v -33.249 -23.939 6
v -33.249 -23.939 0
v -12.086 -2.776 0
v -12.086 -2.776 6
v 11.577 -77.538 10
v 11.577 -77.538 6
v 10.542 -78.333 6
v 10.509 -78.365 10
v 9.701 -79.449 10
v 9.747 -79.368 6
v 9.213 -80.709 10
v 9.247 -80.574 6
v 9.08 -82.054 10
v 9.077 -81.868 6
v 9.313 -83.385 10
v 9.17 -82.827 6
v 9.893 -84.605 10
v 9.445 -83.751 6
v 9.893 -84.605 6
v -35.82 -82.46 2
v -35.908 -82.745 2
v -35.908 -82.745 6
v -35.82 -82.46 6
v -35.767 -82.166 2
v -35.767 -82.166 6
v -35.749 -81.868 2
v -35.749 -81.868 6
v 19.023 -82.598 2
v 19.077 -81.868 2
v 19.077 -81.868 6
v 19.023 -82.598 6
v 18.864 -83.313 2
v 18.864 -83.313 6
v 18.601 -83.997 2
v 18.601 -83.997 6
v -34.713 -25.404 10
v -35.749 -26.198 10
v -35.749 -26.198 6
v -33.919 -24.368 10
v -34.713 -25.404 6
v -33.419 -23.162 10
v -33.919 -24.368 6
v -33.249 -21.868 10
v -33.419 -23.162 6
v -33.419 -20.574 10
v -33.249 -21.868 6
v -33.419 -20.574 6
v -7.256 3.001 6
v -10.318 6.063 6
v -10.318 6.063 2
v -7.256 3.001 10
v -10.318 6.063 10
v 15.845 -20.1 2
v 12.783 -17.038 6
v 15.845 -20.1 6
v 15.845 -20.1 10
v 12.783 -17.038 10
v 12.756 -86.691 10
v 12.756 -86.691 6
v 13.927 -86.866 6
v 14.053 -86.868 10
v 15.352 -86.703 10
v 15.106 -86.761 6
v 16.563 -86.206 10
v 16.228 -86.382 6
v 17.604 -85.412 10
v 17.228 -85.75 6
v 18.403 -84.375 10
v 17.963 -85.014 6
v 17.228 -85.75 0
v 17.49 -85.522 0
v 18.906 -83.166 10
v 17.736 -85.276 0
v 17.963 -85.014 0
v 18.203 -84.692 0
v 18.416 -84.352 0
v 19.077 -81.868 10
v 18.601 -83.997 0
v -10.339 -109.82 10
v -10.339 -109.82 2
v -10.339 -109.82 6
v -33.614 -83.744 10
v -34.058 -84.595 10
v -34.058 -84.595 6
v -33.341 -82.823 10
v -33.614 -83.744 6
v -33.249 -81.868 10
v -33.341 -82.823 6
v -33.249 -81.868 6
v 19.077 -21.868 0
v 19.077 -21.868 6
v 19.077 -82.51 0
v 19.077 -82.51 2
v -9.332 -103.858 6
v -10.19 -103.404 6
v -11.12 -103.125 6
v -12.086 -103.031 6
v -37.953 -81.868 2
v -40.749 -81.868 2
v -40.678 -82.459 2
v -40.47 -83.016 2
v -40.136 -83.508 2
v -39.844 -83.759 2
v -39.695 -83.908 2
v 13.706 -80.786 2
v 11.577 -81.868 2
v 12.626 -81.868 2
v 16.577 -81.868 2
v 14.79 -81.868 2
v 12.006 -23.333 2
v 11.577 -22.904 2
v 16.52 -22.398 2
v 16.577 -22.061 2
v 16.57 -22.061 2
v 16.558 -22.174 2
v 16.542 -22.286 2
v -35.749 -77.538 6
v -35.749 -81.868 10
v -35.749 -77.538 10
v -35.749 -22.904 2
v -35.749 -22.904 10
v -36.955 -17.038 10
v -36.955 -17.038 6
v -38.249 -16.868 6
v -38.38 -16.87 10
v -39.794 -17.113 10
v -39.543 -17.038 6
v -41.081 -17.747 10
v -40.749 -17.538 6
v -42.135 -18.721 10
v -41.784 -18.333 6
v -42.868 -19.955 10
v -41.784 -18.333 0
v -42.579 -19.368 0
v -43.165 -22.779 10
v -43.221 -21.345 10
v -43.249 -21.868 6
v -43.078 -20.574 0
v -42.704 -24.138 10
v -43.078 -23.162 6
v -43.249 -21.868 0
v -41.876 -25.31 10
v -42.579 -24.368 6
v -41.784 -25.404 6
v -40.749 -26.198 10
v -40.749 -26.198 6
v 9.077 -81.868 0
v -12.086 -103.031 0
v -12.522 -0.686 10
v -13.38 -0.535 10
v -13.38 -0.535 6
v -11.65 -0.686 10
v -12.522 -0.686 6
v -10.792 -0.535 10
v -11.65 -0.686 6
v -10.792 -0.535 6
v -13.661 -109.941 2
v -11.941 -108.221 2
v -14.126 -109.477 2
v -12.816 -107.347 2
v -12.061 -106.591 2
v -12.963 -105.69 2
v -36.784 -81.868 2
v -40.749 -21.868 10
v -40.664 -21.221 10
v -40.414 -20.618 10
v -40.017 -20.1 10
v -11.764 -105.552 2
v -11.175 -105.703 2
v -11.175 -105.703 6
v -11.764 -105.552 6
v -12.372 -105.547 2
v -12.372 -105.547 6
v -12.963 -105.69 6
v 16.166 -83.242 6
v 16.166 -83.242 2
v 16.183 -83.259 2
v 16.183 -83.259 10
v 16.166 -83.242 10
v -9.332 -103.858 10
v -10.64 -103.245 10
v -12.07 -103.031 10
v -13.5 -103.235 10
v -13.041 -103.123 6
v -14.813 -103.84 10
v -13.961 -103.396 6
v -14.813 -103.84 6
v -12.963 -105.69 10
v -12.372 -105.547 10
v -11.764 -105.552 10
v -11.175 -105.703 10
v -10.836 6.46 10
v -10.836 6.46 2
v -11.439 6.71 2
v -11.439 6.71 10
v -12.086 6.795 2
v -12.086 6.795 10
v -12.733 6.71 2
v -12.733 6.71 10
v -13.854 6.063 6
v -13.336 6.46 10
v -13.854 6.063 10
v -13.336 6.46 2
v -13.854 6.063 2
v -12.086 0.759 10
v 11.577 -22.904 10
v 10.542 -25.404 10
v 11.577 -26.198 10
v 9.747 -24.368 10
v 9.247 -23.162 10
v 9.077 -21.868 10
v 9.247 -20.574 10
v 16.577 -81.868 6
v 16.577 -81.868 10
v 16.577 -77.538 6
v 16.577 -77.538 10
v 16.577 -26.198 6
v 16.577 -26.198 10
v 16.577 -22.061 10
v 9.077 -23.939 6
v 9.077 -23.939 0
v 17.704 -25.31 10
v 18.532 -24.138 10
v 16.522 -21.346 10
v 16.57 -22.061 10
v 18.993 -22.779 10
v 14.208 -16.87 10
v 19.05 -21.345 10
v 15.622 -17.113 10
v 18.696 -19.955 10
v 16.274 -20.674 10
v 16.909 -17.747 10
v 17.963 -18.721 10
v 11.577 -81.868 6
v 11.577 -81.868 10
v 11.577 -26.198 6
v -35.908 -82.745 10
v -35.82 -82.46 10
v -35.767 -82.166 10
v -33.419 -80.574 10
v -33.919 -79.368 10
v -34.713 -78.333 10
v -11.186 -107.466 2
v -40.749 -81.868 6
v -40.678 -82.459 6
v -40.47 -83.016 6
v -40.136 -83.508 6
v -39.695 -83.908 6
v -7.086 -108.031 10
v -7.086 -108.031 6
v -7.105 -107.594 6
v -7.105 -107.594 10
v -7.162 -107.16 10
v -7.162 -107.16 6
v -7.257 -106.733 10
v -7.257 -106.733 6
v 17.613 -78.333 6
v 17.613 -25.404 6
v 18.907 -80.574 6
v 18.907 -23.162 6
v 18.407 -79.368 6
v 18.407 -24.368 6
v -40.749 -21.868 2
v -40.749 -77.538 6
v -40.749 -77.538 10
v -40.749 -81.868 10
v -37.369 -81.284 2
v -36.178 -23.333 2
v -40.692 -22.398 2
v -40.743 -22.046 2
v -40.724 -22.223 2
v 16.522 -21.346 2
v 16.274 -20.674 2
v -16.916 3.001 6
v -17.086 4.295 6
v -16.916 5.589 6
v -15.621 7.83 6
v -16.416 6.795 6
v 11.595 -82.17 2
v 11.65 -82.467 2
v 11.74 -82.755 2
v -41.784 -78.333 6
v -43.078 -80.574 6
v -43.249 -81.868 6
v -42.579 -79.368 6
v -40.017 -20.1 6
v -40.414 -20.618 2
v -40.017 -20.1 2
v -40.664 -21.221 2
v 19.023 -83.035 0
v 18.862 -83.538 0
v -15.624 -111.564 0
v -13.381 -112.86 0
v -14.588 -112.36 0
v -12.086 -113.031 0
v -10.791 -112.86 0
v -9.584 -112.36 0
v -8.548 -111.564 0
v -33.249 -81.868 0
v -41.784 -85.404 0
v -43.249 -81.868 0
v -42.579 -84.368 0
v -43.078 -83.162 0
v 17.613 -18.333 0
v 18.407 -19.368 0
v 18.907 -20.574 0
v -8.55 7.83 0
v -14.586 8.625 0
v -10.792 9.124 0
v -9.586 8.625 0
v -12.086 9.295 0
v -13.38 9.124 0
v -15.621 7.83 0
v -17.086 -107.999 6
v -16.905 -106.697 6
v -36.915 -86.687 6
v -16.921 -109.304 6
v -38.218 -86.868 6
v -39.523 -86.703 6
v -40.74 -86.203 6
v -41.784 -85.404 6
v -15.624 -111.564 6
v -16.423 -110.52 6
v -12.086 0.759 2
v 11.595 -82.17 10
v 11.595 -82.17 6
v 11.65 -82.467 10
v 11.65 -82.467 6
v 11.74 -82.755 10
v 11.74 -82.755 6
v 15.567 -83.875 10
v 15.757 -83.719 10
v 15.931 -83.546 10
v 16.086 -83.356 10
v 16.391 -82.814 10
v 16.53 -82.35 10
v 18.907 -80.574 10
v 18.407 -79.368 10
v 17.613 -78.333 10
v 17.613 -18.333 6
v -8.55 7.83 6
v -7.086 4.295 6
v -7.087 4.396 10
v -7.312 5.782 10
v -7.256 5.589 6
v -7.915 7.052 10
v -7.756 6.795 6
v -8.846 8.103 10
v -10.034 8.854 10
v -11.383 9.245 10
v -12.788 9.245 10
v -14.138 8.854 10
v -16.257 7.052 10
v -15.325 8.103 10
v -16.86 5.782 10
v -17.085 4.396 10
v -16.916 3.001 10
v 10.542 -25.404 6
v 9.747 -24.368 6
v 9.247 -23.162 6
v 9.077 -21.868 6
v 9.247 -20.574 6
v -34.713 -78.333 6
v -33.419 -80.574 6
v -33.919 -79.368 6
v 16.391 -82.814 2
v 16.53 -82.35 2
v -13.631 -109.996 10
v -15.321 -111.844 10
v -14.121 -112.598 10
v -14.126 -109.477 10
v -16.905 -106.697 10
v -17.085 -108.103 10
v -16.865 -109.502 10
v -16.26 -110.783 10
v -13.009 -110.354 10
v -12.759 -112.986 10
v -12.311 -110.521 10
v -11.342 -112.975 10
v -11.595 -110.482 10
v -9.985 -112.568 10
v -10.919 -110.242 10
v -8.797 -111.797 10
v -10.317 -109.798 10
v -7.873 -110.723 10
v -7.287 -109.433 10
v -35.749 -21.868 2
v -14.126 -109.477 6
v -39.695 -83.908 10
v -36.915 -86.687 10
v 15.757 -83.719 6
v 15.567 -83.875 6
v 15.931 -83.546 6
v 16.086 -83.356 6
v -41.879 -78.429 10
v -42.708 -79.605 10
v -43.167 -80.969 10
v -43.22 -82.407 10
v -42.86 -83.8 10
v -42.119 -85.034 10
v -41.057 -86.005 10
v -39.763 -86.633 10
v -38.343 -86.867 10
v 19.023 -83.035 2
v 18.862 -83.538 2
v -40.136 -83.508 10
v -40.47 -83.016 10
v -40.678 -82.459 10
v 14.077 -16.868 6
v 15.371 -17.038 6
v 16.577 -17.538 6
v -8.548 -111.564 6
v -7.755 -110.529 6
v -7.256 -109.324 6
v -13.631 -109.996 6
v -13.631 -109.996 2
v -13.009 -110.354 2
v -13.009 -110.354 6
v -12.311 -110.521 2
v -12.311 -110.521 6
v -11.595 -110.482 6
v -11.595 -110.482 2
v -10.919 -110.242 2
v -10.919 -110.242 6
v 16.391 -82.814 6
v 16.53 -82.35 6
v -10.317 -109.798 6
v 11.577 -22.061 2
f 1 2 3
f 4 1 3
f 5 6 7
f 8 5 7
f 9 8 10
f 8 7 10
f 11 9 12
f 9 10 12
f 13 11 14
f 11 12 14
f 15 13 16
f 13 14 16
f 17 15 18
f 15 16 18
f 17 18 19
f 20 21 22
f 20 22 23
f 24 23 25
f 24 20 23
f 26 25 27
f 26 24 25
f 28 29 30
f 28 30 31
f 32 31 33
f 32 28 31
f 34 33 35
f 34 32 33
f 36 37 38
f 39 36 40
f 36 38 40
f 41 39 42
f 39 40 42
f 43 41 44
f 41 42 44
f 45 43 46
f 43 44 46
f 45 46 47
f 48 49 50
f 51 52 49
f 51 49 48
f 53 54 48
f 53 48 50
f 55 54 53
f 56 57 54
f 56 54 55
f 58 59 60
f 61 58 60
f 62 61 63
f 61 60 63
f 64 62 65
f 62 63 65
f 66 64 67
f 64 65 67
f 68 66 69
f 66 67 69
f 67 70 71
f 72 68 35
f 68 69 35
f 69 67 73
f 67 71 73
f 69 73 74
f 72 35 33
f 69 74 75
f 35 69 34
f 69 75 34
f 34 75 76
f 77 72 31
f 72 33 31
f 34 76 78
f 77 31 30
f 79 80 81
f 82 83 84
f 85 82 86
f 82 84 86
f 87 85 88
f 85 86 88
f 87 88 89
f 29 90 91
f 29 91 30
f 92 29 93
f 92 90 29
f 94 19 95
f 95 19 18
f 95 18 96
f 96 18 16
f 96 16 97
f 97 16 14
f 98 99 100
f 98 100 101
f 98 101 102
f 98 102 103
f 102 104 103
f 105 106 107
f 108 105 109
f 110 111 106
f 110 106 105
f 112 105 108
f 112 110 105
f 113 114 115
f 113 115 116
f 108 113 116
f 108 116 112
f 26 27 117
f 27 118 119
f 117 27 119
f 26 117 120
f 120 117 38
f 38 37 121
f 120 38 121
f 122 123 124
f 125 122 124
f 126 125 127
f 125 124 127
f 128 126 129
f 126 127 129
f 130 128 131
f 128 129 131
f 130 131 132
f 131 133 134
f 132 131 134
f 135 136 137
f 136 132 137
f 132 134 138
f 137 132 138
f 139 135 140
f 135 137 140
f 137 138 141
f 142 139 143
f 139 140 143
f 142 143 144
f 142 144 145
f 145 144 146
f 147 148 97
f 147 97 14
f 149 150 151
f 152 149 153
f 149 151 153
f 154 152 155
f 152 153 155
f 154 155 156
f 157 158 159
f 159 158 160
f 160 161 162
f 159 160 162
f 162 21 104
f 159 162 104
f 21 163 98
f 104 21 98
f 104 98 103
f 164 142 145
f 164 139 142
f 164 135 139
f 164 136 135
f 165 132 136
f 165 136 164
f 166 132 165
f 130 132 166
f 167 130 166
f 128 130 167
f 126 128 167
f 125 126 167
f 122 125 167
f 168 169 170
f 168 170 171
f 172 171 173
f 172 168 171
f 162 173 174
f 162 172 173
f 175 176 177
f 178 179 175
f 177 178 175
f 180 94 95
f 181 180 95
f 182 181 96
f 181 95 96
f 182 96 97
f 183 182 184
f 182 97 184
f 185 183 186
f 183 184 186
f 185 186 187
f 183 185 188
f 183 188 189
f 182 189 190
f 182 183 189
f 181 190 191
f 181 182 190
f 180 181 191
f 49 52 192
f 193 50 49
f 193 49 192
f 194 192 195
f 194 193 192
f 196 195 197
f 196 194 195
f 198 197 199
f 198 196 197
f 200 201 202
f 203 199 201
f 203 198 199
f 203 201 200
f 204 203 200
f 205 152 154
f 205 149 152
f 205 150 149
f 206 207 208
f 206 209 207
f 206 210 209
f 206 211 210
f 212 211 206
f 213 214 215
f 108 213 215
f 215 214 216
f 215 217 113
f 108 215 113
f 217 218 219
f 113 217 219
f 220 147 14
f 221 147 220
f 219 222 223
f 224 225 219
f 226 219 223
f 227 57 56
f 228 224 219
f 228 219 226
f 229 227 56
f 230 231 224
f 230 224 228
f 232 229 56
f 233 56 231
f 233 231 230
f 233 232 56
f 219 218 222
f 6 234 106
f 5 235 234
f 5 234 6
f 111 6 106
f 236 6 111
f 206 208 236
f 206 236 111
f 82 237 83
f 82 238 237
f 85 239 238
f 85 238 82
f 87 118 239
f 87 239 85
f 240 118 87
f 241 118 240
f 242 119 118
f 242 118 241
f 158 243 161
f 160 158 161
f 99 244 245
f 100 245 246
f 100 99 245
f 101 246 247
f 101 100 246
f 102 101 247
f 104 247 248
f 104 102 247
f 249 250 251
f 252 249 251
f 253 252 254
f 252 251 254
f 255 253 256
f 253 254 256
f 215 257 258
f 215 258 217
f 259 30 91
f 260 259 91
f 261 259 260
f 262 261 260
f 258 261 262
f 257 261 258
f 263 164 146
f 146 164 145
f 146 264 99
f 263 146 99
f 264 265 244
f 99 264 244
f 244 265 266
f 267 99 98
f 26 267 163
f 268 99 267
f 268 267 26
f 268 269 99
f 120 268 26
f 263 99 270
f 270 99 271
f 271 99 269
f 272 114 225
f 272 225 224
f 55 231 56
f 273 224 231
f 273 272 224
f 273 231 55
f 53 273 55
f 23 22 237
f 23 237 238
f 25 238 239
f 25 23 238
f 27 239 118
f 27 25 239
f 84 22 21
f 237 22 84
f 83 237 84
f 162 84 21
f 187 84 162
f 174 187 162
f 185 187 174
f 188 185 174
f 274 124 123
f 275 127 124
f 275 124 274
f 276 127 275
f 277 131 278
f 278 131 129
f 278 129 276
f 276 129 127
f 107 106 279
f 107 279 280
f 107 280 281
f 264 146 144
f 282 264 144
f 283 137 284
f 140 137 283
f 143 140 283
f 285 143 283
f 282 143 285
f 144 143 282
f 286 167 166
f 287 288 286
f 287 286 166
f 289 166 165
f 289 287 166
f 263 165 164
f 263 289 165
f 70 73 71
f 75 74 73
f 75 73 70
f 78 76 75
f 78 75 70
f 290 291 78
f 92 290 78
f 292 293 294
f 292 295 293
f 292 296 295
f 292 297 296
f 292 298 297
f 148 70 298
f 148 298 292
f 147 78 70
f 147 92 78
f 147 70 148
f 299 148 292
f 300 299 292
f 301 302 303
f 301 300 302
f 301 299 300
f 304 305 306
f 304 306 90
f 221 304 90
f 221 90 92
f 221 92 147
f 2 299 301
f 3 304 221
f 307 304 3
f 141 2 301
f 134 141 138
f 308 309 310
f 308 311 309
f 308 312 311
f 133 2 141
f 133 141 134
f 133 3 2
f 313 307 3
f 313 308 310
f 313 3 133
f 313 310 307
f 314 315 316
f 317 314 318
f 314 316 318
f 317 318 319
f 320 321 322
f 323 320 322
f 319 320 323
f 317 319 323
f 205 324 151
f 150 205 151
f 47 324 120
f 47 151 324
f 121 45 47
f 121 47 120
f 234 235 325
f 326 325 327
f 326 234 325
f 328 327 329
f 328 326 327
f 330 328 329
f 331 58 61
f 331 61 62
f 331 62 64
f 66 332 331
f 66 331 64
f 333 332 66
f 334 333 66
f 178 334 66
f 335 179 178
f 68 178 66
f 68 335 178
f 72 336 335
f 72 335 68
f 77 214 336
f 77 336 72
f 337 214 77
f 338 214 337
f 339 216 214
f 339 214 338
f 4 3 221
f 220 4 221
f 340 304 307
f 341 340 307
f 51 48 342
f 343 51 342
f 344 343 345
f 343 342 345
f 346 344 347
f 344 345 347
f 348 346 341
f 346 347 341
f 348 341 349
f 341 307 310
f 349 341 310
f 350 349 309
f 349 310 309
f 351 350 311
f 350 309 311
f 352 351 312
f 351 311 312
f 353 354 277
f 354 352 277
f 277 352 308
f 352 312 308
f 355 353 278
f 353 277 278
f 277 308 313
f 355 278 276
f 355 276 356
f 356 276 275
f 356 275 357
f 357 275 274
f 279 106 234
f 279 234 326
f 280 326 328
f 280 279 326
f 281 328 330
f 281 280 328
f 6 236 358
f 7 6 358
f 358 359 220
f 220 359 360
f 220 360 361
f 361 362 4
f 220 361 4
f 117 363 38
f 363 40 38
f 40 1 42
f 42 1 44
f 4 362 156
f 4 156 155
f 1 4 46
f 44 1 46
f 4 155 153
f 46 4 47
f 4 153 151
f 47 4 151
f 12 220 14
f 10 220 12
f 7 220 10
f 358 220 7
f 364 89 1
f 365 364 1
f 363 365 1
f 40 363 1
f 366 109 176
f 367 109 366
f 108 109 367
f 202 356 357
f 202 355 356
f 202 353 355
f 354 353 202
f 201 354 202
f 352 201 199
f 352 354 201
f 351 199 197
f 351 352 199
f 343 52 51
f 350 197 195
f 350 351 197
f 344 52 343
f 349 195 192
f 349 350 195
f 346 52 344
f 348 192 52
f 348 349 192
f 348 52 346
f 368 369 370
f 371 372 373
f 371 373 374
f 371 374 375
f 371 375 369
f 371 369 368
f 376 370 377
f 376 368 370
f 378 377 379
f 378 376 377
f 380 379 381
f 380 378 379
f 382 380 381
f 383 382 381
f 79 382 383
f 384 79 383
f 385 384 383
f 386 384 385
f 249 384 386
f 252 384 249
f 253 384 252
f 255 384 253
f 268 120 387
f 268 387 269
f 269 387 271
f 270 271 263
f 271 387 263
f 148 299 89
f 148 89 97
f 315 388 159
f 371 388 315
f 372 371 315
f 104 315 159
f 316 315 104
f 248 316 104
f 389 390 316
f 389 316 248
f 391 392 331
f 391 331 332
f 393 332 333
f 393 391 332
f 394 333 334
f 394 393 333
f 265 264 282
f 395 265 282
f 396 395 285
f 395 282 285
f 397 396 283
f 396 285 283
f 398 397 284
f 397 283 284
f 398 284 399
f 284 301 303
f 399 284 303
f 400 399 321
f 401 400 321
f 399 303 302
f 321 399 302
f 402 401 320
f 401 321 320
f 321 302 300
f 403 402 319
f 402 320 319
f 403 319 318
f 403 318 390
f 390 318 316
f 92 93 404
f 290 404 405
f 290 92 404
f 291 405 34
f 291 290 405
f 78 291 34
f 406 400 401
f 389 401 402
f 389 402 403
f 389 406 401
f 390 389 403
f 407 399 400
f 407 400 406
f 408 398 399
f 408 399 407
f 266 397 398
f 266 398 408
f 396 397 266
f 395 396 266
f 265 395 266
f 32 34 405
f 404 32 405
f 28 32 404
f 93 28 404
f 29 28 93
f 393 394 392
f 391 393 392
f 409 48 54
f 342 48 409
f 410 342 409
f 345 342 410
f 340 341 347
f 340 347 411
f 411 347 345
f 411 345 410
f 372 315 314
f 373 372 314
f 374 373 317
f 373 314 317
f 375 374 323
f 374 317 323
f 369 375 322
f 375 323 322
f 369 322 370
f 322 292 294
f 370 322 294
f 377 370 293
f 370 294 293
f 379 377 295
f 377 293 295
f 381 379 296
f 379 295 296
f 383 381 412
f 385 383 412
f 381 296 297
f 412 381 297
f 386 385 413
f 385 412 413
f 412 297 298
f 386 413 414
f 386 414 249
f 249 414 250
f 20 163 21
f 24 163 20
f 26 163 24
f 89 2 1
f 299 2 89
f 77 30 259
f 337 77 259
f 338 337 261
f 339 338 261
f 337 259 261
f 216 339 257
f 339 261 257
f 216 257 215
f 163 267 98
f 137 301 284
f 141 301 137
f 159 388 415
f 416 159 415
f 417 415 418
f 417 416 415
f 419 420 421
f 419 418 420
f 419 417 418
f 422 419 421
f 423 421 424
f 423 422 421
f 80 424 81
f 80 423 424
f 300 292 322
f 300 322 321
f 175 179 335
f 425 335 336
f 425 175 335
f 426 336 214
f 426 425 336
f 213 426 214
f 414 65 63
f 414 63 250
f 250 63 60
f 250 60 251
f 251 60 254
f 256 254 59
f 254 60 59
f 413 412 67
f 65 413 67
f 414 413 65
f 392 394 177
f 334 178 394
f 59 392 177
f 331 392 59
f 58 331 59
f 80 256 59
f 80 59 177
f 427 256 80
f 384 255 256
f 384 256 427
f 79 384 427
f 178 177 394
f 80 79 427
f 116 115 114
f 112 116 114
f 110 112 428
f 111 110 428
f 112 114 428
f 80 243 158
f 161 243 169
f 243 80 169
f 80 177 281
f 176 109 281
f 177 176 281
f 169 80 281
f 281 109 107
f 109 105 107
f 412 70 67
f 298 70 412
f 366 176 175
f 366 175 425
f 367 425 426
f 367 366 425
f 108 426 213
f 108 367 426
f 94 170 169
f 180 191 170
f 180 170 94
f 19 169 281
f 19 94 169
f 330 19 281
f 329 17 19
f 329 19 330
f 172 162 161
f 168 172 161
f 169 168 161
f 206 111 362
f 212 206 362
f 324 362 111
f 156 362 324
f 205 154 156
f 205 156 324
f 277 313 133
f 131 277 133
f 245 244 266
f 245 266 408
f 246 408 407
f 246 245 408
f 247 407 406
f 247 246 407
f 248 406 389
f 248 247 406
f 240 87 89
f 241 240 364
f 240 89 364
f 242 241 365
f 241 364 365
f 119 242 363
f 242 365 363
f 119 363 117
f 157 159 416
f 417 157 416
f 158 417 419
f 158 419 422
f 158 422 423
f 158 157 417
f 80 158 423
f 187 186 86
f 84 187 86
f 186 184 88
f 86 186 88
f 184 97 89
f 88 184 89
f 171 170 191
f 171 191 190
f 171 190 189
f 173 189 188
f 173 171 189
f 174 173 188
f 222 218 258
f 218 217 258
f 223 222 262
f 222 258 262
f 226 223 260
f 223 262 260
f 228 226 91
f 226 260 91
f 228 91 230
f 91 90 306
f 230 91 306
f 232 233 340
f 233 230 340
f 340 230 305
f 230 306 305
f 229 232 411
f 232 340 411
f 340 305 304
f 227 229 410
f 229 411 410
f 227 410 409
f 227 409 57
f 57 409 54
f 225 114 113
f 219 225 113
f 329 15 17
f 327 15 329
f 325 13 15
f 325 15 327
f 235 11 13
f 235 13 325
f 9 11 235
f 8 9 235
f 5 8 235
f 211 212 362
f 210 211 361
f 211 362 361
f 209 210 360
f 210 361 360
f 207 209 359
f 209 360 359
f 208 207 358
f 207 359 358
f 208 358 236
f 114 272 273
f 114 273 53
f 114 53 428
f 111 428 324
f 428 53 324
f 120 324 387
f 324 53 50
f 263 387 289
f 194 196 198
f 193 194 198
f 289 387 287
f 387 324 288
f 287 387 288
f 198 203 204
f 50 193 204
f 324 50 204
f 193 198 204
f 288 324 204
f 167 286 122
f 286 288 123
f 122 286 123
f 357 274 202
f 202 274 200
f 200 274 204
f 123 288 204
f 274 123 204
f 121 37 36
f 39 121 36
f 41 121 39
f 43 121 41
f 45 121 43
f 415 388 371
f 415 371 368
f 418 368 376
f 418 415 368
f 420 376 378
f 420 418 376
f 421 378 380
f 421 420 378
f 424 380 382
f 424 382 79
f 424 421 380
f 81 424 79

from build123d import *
from build123d.topology import SkipClean

# Parameters (mm, degrees)
SKETCH_1_R                      = 5
SKETCH_1_R_2                    = 2.5
EXTRUDE_1_DEPTH                 = 10
EXTRUDE_1_2_DEPTH               = 10
EXTRUDE_1_3_DEPTH               = 10
EXTRUDE_1_4_DEPTH               = 10
EXTRUDE_1_5_DEPTH               = 10
EXTRUDE_1_6_DEPTH               = 10
EXTRUDE_2_DEPTH                 = 6
EXTRUDE_4_DEPTH                 = 6
CUT_EXTRUDE_1_DEPTH             = 4
SKETCH_5_R                      = 3.75
SKETCH_5_R_2                    = 2.5
EXTRUDE_3_DEPTH                 = 2
CUT_EXTRUDE_2_DEPTH             = 4
CUT_EXTRUDE_3_DEPTH             = 8
SKETCH_11_R                     = 2.5
EXTRUDE_9_DEPTH                 = 2
AUFSATZ_LINEAR_AUSTRAGEN1_DEPTH = 6
SKIZZE4_W                       = 5
SKIZZE4_H                       = 59.806963929
SCHNITT_LINEAR_AUSTRAGEN1_DEPTH = 8
SCHNITT_LINEAR_AUSTRAGEN2_DEPTH = 8
SCHNITT_LINEAR_AUSTRAGEN3_DEPTH = 8
SCHNITT_LINEAR_AUSTRAGEN6_DEPTH = 8
SCHNITT_LINEAR_START            = -4
SCHNITT_LINEAR_AUSTRAGEN7_DEPTH = 4


with BuildPart() as part:
    # Эскиз1 → Бобышка-Вытянуть1 (new body)
    with BuildSketch(Plane.XY):
        with Locations((-12.085916667, 4.294857344)):
            Circle(SKETCH_1_R)
        with Locations((-12.085916667, 4.294857344)):
            Circle(SKETCH_1_R_2, mode=Mode.SUBTRACT)
    extrude(amount=EXTRUDE_1_DEPTH)



with BuildPart() as body_2:
    # Эскиз1 → Extrude 1 2 (new body)
    with BuildSketch(Plane.XY):
        with Locations((-38.24886757, -21.86809356)):
            Circle(SKETCH_1_R)
        with Locations((-38.24886757, -21.86809356)):
            Circle(SKETCH_1_R_2, mode=Mode.SUBTRACT)
    extrude(amount=EXTRUDE_1_2_DEPTH)


with BuildPart() as body_3:
    # Эскиз1 → Extrude 1 3 (new body)
    with BuildSketch(Plane.XY):
        with Locations((14.077034237, -21.86809356)):
            Circle(SKETCH_1_R)
        with Locations((14.077034237, -21.86809356)):
            Circle(SKETCH_1_R_2, mode=Mode.SUBTRACT)
    extrude(amount=EXTRUDE_1_3_DEPTH)


with BuildPart() as body_4:
    # Эскиз1 → Extrude 1 4 (new body)
    with BuildSketch(Plane.XY):
        with Locations((-38.24886757, -81.86809356)):
            Circle(SKETCH_1_R)
        with Locations((-38.24886757, -81.86809356)):
            Circle(SKETCH_1_R_2, mode=Mode.SUBTRACT)
    extrude(amount=EXTRUDE_1_4_DEPTH)


with BuildPart() as body_5:
    # Эскиз1 → Extrude 1 5 (new body)
    with BuildSketch(Plane.XY):
        with Locations((14.077034237, -81.86809356)):
            Circle(SKETCH_1_R)
        with Locations((14.077034237, -81.86809356)):
            Circle(SKETCH_1_R_2, mode=Mode.SUBTRACT)
    extrude(amount=EXTRUDE_1_5_DEPTH)


with BuildPart() as body_6:
    # Эскиз1 → Extrude 1 6 (new body)
    with BuildSketch(Plane.XY):
        with Locations((-12.085916667, -108.031044464)):
            Circle(SKETCH_1_R)
        with Locations((-12.085916667, -108.031044464)):
            Circle(SKETCH_1_R_2, mode=Mode.SUBTRACT)
    extrude(amount=EXTRUDE_1_6_DEPTH)


with BuildPart() as part_1:
    add(part.part)

    add(body_2.part)  # Бобышка-Вытянуть2 merges body 2
    # Эскиз3 → Бобышка-Вытянуть2 (add)
    with BuildSketch(Plane(origin=(0, 0, 0), x_dir=(-1, 0, 0), z_dir=(0, 0, -1))):
        Polygon((12.085916667, 4.294857344), (15.621450572, 7.83039125), (41.784401476, -18.332559654), (34.713333665, -25.403627466), (8.550382761, 0.759323438), align=None)
    extrude(amount=-EXTRUDE_2_DEPTH)


    add(body_3.part)  # Бобышка-Вытянуть4 merges body 3
    # Эскиз9 → Бобышка-Вытянуть4 (add)
    with BuildSketch(Plane(origin=(0, 0, 0), x_dir=(-1, 0, 0), z_dir=(0, 0, -1))):
        Polygon((-14.077034237, -21.86809356), (-17.612568143, -18.332559654), (8.550382761, 7.83039125), (15.621450572, 0.759323438), (-10.541500331, -25.403627466), align=None)
    extrude(amount=-EXTRUDE_4_DEPTH)

    # Эскиз4 → Вырез-Вытянуть1 (cut)
    with BuildSketch(Plane.XY.offset(6)):
        Polygon((-13.85368362, 6.062624297), (-10.318149714, 2.527090391), (-36.481100617, -23.635860513), (-40.016634523, -20.100326607), align=None)
    extrude(amount=-CUT_EXTRUDE_1_DEPTH, mode=Mode.SUBTRACT)

    # Эскиз5 → Бобышка-Вытянуть3 (add)
    with BuildSketch(Plane(origin=(0, 0, 0), x_dir=(-1, 0, 0), z_dir=(0, 0, -1))):
        with Locations((12.969800143, 5.178740821)):
            Circle(SKETCH_5_R)
        with Locations((38.24886757, -21.86809356)):
            Circle(SKETCH_5_R_2)
    extrude(amount=-EXTRUDE_3_DEPTH)

    # Эскиз4<2> → Вырез-Вытянуть2 (cut)
    with BuildSketch(Plane.XY.offset(6)):
        Polygon((-13.85368362, 6.062624297), (-10.318149714, 2.527090391), (-36.481100617, -23.635860513), (-40.016634523, -20.100326607), align=None)
    extrude(amount=CUT_EXTRUDE_2_DEPTH, mode=Mode.SUBTRACT)

    # Эскиз10 → Вырез-Вытянуть3 (cut)
    with BuildSketch(Plane.XY.offset(10)):
        Polygon((14.077034237, -21.86809356), (12.309267284, -23.635860513), (-13.85368362, 2.527090391), (-12.085916667, 4.294857344), (-10.318149714, 6.062624297), (15.84480119, -20.100326607), align=None)
    extrude(amount=-CUT_EXTRUDE_3_DEPTH, mode=Mode.SUBTRACT)

    # Эскиз11 → Бобышка-Вытянуть9 (add)
    with BuildSketch(Plane(origin=(0, 0, 0), x_dir=(-1, 0, 0), z_dir=(0, 0, -1))):
        with Locations((-14.077034237, -21.86809356)):
            Circle(SKETCH_11_R)
    extrude(amount=-EXTRUDE_9_DEPTH)


    add(body_4.part)  # Aufsatz-Linear austragen1 merges body 4

    add(body_5.part)  # Aufsatz-Linear austragen1 merges body 5

    add(body_6.part)  # Aufsatz-Linear austragen1 merges body 6
    # Skizze2 → Aufsatz-Linear austragen1 (add)
    with BuildSketch(Plane(origin=(0, 0, 0), x_dir=(-1, 0, 0), z_dir=(0, 0, -1))):
        with BuildLine():
            Line((-19.077034237, -21.86809356), (-19.077034237, -82.509912102))
            ThreePointArc((-19.077034237, -82.509912102), (-18.955201687, -83.290446679), (-18.601294786, -83.996723751))
            Line((-18.601294786, -83.996723751), (-17.963462032, -85.013833377))
            Line((-17.963462032, -85.013833377), (8.547769183, -111.563962859))
            Line((8.547769183, -111.563962859), (15.62406415, -111.563962859))
            Line((15.62406415, -111.563962859), (41.784377989, -85.403650953))
            Line((41.784377989, -85.403650953), (43.24886757, -81.86809356))
            Line((43.24886757, -81.86809356), (43.24886757, -21.86809356))
            Line((43.24886757, -21.86809356), (33.24886757, -23.939161372))
            Line((33.24886757, -23.939161372), (33.24886757, -81.86809356))
            Line((33.24886757, -81.86809356), (12.085916667, -103.031044464))
            Line((12.085916667, -103.031044464), (-9.077034237, -81.86809356))
            Line((-9.077034237, -81.86809356), (-9.077034237, -23.939161372))
            Line((-9.077034237, -23.939161372), (-19.077034237, -21.86809356))
        make_face()
    extrude(amount=-AUFSATZ_LINEAR_AUSTRAGEN1_DEPTH)

    # Skizze4 → Schnitt-Linear austragen1 (cut)
    with SkipClean():  # the faces are left unmerged after this step: merging them gives an invalid solid
        with BuildSketch(Plane.XY.offset(10)):
            with Locations((14.077034237, -51.964611596)):
                Rectangle(SKIZZE4_W, SKIZZE4_H)
        extrude(amount=-SCHNITT_LINEAR_AUSTRAGEN1_DEPTH, mode=Mode.SUBTRACT)

    # Skizze5 → Schnitt-Linear austragen2 (cut)
    with SkipClean():  # the faces are left unmerged after this step: merging them gives an invalid solid
        with BuildSketch(Plane.XY.offset(10)):
            Polygon((-38.24886757, -81.86809356), (-35.74886757, -81.86809356), (-35.74886757, -21.86809356), (-40.74886757, -21.86809356), (-40.74886757, -81.86809356), align=None)
        extrude(amount=-SCHNITT_LINEAR_AUSTRAGEN2_DEPTH, mode=Mode.SUBTRACT)

    # Skizze6 → Schnitt-Linear austragen3 (cut)
    with SkipClean():  # the faces are left unmerged after this step: merging them gives an invalid solid
        with BuildSketch(Plane.XY.offset(10)):
            Polygon((-12.815807368, -107.346754652), (13.705977842, -80.78605569), (16.182665193, -83.259114477), (-10.339120017, -109.819813439), align=None)
        extrude(amount=-SCHNITT_LINEAR_AUSTRAGEN3_DEPTH, mode=Mode.SUBTRACT)

    # Skizze8 → Schnitt-Linear austragen6 (cut)
    with SkipClean():  # the faces are left unmerged after this step: merging them gives an invalid solid
        with BuildSketch(Plane.XY.offset(10)):
            Polygon((-37.36882645, -81.283668587), (-11.186213036, -107.466282), (-13.66108677, -109.941155734), (-39.843700184, -83.758542321), align=None)
        extrude(amount=-SCHNITT_LINEAR_AUSTRAGEN6_DEPTH, mode=Mode.SUBTRACT)

    # Skizze10 → Schnitt-Linear austragen7 (cut)
    with SkipClean():  # the faces are left unmerged after this step: merging them gives an invalid solid
        with BuildSketch(Plane.XY.offset(6).offset(SCHNITT_LINEAR_START)):
            with BuildLine():
                Line((-11.940605405, -108.220674369), (-13.66108677, -109.941155734))
                Line((-13.66108677, -109.941155734), (-14.125547986, -109.476694519))
                ThreePointArc((-14.125547986, -109.476694519), (-12.311454238, -110.52085024), (-10.339260555, -109.819673108))
                Line((-10.339260555, -109.819673108), (-11.940605405, -108.220674369))
            make_face()
            with BuildLine():
                Line((-12.962669252, -105.689825784), (-12.061327377, -106.591167659))
                Line((-12.061327377, -106.591167659), (-11.174544611, -105.703083773))
                ThreePointArc((-11.174544611, -105.703083773), (-12.067381012, -105.531113179), (-12.962669252, -105.689825784))
            make_face()
            with BuildLine():
                Line((-39.843700184, -83.758542321), (-37.953251423, -81.86809356))
                Line((-37.953251423, -81.86809356), (-40.74886757, -81.86809356))
                ThreePointArc((-40.74886757, -81.86809356), (-40.46969232, -83.01610812), (-39.694517625, -83.907724879))
                Line((-39.694517625, -83.907724879), (-39.843700184, -83.758542321))
            make_face()
            with BuildLine():
                Line((-36.784401476, -81.86809356), (-35.907648891, -82.744846145))
                ThreePointArc((-35.907648891, -82.744846145), (-35.78888315, -82.313600744), (-35.74886757, -81.86809356))
                Line((-35.74886757, -81.86809356), (-36.784401476, -81.86809356))
            make_face()
            with BuildLine():
                Line((14.789603319, -81.86809356), (16.165610117, -83.242084387))
                ThreePointArc((16.165610117, -83.242084387), (16.471970531, -82.585226846), (16.577034237, -81.86809356))
                Line((16.577034237, -81.86809356), (14.789603319, -81.86809356))
            make_face()
            with BuildLine():
                Line((11.739718918, -82.755199583), (12.625525252, -81.86809356))
                Line((12.625525252, -81.86809356), (11.577034237, -81.86809356))
                ThreePointArc((11.577034237, -81.86809356), (11.61804173, -82.319043502), (11.739718918, -82.755199583))
            make_face()
            with BuildLine():
                Line((19.077034237, -82.509912102), (19.077034237, -81.86809356))
                ThreePointArc((19.077034237, -81.86809356), (18.956650141, -82.958666175), (18.601294786, -83.996723751))
                ThreePointArc((18.601294786, -83.996723751), (18.955201687, -83.290446679), (19.077034237, -82.509912102))
            make_face()
        extrude(amount=SCHNITT_LINEAR_AUSTRAGEN7_DEPTH, mode=Mode.SUBTRACT)


solid = part_1.part
